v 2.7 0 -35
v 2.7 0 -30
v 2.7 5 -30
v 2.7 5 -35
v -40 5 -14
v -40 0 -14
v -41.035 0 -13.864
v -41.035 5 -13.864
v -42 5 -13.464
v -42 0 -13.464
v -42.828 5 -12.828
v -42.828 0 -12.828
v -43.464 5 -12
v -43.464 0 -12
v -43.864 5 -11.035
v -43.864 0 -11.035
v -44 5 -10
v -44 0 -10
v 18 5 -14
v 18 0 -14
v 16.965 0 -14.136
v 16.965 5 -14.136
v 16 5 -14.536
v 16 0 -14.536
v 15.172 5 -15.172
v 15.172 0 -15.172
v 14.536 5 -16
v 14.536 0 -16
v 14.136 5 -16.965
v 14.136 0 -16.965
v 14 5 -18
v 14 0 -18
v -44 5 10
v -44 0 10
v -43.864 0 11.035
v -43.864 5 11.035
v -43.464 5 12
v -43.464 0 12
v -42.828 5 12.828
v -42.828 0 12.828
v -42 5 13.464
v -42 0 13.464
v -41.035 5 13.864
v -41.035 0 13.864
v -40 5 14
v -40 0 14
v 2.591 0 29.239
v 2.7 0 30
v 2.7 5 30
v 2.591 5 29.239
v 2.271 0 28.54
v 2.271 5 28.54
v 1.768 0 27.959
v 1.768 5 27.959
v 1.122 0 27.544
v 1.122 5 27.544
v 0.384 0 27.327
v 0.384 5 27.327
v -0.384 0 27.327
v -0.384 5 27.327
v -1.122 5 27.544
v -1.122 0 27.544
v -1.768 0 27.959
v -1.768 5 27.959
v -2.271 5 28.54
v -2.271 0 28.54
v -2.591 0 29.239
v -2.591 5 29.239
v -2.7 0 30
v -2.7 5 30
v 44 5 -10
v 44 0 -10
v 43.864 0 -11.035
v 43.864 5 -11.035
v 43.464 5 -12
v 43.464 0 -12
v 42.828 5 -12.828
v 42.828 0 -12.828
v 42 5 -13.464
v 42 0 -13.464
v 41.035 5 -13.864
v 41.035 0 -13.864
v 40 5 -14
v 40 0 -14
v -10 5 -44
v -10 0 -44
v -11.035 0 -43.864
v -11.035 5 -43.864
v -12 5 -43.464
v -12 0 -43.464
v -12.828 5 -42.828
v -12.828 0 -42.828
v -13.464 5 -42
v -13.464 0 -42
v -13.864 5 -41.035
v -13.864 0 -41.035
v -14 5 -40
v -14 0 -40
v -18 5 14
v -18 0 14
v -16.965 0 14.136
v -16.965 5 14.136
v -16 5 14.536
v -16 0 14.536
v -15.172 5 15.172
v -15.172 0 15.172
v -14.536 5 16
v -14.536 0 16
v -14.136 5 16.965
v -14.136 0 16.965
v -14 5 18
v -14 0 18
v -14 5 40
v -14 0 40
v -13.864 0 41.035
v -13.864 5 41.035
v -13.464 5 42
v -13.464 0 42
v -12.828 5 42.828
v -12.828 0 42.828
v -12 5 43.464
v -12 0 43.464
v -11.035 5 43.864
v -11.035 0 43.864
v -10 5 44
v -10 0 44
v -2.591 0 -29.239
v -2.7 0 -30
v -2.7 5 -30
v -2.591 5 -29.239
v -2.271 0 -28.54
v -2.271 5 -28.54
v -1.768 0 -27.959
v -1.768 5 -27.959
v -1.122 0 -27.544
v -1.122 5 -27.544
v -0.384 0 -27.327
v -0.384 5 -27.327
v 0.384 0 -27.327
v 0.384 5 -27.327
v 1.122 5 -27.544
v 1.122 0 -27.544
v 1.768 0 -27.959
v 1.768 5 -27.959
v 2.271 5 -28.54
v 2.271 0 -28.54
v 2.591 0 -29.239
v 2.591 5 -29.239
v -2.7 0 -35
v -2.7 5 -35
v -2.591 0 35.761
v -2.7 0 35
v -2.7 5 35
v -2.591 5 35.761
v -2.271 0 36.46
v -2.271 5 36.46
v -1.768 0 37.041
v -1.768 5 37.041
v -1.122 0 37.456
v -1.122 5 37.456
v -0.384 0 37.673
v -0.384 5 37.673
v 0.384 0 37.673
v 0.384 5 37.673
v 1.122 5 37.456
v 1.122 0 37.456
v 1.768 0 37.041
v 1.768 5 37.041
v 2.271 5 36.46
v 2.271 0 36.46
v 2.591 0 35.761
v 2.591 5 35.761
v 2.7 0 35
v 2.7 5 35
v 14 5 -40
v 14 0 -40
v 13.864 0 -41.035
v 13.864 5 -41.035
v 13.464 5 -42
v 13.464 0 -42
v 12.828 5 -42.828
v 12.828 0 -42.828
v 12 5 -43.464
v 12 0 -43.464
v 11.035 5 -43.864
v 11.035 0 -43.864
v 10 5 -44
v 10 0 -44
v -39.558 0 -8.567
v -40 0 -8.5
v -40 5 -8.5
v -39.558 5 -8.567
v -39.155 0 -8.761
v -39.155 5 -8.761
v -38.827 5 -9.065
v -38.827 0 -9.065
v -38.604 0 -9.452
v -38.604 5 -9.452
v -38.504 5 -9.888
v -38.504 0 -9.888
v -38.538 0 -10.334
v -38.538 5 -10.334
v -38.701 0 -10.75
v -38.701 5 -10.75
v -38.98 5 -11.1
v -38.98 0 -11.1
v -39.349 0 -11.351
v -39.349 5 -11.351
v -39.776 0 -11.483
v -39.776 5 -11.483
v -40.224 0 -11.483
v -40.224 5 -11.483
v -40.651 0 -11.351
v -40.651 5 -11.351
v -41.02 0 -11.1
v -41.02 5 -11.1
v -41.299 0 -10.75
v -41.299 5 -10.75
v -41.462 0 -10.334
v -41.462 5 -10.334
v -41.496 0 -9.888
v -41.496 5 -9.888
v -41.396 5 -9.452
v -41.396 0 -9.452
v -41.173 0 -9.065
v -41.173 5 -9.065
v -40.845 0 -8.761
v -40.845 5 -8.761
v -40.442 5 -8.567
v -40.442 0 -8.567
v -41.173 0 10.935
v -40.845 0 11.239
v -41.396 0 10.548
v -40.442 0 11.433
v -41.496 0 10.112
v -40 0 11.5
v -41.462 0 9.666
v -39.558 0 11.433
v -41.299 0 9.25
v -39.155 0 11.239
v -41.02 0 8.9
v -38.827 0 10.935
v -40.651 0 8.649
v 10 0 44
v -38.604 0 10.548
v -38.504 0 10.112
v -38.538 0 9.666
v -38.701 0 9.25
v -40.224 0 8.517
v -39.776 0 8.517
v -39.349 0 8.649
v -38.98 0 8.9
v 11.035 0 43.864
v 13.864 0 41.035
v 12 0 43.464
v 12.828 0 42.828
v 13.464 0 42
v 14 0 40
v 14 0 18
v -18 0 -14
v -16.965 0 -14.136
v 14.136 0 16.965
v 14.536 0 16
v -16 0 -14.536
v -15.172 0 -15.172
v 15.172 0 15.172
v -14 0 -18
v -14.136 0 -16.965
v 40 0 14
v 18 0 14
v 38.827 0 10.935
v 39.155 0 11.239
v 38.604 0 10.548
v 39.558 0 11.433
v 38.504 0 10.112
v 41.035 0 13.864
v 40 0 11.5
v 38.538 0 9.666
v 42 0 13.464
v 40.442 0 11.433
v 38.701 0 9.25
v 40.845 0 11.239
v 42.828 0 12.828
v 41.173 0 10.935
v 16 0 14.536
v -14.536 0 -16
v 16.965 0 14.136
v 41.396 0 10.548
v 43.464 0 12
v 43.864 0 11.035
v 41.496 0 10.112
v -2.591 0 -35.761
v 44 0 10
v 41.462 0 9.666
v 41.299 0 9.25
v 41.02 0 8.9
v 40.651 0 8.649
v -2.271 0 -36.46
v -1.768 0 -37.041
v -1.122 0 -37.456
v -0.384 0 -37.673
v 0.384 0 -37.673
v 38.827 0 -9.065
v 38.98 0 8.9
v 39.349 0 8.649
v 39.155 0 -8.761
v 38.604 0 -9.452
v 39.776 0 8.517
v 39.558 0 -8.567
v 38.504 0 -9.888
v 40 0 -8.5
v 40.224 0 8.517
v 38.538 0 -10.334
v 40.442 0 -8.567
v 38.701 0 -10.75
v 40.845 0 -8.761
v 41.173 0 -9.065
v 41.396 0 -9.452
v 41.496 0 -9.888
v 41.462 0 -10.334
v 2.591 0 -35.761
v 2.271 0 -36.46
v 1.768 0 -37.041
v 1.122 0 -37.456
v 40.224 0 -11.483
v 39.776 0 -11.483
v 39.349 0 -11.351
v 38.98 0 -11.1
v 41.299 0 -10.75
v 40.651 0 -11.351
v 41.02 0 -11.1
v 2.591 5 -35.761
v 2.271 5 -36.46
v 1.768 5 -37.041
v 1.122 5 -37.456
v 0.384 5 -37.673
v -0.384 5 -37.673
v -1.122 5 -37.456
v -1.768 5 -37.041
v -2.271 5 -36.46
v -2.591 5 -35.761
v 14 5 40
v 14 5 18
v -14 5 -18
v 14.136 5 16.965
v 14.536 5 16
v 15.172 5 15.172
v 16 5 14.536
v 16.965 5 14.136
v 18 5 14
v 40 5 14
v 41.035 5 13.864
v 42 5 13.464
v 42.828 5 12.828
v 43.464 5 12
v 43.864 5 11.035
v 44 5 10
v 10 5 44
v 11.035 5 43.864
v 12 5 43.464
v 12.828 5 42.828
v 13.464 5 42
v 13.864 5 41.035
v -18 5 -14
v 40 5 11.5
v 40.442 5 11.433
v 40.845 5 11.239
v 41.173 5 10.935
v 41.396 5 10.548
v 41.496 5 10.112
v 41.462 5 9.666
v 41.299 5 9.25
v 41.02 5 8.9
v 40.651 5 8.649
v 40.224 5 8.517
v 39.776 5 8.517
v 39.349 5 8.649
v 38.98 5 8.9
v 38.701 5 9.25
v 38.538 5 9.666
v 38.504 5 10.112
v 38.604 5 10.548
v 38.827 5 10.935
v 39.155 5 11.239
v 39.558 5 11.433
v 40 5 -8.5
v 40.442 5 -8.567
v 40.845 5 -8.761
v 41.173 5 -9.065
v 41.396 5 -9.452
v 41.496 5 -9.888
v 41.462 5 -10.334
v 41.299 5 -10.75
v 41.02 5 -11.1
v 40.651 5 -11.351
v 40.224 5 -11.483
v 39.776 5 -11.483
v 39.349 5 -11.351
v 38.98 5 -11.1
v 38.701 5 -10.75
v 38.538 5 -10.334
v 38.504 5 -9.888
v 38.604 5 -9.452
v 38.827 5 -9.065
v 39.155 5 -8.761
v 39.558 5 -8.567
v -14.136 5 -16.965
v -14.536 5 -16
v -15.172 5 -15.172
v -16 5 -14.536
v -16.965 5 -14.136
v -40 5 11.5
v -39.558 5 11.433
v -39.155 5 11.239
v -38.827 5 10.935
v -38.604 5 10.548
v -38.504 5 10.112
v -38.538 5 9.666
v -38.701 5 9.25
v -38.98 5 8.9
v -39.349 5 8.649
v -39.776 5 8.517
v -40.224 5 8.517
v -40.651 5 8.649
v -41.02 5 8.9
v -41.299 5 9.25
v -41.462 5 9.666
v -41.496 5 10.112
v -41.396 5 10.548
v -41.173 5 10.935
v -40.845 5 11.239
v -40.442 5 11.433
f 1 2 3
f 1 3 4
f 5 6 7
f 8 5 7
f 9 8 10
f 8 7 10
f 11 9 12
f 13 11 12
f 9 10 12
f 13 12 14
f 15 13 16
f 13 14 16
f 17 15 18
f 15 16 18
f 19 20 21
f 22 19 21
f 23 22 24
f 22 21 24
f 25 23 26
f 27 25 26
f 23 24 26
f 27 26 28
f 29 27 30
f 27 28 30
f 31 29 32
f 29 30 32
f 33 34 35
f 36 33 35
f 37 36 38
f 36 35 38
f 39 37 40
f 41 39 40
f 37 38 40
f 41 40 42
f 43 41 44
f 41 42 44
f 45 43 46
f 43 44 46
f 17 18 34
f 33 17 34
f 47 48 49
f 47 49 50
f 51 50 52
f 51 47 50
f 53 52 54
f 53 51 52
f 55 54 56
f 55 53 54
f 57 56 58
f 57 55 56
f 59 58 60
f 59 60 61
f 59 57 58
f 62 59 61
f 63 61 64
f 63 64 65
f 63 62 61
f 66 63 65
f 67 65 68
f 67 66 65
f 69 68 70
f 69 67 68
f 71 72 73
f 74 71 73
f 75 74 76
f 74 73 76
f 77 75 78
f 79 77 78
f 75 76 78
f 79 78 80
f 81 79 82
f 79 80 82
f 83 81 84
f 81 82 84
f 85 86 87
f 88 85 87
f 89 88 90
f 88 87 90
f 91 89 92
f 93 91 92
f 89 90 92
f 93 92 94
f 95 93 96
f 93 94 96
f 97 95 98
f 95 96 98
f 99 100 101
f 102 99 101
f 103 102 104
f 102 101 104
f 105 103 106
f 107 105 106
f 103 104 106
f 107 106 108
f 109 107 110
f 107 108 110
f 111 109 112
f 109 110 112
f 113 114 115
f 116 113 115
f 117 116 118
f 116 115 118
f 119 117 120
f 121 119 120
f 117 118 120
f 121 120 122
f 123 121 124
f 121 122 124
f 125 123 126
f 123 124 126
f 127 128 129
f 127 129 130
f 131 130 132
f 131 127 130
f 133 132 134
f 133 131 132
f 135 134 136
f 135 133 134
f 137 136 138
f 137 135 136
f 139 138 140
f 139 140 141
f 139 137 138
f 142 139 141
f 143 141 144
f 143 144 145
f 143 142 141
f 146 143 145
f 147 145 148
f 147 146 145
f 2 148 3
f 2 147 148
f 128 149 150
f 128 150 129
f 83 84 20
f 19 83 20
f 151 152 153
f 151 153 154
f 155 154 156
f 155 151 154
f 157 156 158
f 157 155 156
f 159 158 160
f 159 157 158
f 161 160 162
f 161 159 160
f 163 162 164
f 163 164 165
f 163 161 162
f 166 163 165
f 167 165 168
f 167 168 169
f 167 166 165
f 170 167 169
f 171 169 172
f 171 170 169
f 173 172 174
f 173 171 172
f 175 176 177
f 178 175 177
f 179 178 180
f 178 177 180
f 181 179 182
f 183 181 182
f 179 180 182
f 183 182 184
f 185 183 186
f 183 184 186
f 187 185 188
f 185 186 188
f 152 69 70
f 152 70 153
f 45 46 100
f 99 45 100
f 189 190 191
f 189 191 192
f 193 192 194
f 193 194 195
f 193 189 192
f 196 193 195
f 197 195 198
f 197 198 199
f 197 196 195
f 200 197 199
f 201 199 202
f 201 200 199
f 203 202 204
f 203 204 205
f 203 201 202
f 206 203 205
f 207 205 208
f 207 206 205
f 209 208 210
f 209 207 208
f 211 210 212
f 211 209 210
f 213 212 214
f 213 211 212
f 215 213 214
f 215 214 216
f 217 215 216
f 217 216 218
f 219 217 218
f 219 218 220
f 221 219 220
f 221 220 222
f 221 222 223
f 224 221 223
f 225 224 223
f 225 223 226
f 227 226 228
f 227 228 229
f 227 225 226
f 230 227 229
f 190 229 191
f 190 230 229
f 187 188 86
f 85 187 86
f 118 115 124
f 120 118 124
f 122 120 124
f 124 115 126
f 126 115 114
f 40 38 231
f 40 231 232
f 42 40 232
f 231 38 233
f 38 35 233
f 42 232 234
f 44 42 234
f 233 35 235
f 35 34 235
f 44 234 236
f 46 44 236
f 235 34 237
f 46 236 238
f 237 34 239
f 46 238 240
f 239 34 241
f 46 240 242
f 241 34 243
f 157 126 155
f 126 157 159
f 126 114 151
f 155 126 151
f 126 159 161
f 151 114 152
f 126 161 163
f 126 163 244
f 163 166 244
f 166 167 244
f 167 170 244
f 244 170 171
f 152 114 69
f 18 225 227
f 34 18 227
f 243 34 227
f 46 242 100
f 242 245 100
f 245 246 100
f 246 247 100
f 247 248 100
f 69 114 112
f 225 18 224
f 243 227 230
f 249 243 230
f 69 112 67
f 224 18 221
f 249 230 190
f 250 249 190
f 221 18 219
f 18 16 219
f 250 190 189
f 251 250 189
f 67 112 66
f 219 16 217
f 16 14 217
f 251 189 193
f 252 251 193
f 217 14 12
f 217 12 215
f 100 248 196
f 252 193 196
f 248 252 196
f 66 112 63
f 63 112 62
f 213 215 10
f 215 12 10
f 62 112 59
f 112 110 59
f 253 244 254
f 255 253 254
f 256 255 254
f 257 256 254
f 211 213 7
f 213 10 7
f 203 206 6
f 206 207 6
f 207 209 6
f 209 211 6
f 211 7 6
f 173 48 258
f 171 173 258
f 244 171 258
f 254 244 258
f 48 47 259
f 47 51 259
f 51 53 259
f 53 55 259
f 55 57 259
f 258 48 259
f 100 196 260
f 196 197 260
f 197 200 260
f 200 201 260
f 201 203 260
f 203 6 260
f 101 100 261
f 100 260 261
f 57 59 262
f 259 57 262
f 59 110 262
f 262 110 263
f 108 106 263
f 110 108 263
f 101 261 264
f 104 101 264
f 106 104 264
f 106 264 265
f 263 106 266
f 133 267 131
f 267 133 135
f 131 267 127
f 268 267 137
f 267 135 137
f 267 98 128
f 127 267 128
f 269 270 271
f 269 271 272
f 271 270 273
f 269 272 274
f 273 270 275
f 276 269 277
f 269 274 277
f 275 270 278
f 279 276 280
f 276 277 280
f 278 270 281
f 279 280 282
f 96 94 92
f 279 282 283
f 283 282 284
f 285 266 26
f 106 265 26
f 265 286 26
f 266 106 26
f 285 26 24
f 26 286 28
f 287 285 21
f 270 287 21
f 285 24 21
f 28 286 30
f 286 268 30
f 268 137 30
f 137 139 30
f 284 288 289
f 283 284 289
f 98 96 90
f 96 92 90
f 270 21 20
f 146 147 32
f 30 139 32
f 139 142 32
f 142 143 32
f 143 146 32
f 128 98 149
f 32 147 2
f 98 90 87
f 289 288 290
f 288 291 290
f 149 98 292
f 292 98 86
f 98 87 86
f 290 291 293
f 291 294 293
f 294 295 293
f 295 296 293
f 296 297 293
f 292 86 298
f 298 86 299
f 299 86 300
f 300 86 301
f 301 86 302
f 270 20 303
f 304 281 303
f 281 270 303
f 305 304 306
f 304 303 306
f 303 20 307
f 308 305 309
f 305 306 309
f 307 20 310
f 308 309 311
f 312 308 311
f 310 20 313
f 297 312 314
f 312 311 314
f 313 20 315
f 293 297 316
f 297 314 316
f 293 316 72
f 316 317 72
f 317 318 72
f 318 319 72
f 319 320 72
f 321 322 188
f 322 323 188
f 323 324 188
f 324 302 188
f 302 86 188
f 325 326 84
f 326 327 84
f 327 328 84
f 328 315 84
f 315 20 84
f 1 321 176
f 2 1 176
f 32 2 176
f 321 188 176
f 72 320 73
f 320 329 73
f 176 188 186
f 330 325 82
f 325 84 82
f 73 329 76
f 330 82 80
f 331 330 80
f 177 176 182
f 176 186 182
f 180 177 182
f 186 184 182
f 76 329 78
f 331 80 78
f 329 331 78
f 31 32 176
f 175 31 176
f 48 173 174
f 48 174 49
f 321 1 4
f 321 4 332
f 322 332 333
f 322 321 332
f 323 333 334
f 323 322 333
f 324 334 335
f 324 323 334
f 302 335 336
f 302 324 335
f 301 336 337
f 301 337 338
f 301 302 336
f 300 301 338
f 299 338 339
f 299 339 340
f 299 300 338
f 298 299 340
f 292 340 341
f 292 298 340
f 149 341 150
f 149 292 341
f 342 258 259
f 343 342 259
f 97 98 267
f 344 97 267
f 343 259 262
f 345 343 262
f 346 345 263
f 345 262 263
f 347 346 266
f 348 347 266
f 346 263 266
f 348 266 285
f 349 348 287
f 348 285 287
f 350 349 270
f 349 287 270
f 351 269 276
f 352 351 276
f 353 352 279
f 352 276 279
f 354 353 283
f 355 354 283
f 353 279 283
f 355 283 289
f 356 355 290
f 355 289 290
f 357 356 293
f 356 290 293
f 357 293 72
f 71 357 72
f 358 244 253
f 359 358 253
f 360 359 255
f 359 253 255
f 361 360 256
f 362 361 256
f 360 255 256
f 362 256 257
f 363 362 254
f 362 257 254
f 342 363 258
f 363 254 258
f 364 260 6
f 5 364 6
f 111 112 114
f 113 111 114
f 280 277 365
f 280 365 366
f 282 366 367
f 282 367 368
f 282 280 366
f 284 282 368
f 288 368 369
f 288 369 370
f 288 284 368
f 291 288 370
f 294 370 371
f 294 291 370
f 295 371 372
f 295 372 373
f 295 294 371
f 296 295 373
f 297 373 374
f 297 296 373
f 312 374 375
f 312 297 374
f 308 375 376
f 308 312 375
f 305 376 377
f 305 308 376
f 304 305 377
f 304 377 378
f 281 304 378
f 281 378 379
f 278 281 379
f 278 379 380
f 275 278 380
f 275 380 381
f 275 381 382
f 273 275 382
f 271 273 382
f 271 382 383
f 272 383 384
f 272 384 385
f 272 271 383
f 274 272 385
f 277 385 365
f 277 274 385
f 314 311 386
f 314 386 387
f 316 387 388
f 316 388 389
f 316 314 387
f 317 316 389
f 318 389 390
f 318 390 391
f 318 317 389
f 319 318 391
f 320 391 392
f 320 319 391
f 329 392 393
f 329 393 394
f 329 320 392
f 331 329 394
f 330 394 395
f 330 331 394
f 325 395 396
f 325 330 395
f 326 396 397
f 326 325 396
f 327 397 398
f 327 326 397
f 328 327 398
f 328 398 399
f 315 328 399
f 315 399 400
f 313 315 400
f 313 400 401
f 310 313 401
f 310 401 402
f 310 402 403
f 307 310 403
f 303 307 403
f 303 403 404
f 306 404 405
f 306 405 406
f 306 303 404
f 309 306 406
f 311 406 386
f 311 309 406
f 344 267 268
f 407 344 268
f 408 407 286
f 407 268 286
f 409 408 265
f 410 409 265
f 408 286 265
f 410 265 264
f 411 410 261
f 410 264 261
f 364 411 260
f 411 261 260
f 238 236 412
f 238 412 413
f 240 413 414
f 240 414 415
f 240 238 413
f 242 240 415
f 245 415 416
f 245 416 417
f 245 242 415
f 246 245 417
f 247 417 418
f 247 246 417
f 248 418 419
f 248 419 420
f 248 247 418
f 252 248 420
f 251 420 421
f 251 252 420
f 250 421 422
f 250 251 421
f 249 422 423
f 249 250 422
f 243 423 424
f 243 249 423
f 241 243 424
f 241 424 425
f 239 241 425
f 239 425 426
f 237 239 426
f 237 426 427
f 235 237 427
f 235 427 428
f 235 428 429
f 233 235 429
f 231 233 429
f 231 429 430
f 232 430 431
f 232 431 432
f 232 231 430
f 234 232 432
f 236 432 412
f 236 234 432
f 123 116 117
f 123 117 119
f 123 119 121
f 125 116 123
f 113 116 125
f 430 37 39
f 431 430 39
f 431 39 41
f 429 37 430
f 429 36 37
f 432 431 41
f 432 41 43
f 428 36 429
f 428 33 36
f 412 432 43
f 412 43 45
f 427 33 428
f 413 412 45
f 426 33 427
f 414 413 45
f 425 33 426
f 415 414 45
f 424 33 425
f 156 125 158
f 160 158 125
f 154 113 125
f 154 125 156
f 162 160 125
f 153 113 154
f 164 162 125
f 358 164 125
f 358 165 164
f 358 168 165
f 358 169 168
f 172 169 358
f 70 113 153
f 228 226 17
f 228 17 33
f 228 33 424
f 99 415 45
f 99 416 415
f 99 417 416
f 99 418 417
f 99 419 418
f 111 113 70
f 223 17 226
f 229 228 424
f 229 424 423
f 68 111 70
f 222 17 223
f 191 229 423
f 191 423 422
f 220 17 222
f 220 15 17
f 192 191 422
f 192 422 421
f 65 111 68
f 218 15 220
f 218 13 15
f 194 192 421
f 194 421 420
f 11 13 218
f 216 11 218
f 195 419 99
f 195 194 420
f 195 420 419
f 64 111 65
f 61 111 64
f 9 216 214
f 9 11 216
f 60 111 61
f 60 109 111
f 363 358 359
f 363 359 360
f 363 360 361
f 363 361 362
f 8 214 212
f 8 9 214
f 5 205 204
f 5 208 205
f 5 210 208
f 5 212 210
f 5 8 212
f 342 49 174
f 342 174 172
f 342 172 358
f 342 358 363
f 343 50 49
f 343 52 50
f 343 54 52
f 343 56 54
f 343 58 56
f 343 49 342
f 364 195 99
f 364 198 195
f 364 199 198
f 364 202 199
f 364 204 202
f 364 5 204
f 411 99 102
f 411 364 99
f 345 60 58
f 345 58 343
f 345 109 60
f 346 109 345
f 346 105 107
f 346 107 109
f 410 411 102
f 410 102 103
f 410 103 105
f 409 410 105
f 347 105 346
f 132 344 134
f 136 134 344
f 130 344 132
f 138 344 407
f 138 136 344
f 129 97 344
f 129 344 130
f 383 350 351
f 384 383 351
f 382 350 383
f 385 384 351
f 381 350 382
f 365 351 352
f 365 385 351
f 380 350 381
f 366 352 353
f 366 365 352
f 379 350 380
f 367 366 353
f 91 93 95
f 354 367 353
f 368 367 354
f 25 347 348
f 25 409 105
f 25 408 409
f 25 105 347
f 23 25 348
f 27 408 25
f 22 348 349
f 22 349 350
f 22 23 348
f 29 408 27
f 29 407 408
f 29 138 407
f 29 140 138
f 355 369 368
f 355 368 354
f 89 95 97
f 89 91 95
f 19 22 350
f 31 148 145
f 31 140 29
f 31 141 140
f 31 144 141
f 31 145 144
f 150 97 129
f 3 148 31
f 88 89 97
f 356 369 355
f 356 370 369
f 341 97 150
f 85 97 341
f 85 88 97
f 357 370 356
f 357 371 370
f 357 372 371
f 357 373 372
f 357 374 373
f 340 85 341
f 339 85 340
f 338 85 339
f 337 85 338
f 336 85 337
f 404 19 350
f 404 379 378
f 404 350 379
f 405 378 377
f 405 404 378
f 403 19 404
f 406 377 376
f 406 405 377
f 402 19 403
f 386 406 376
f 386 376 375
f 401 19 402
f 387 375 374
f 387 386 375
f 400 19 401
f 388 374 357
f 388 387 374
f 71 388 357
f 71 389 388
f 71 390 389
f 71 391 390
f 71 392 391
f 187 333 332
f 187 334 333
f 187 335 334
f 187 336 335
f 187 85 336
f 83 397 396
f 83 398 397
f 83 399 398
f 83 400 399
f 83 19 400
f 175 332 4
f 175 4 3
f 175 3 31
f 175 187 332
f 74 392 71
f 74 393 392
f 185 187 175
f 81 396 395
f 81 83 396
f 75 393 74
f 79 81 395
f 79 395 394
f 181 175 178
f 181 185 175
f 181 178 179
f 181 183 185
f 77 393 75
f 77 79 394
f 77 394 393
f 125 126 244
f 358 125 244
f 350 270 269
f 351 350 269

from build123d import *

# Parameters (mm, degrees)
SKETCH_1_R      = 1.5
EXTRUDE_1_DEPTH = 5


with BuildPart() as part:
    # 草图1 → 凸台-拉伸1 (new body)
    with BuildSketch(Plane(origin=(0, 0, 0), x_dir=(1, 0, 0), z_dir=(0, 1, 0))):
        with BuildLine():
            Line((14, -40), (14, -18))
            ThreePointArc((14, -18), (15.171572875, -15.171572875), (18, -14))
            Line((18, -14), (40, -14))
            ThreePointArc((40, -14), (42.828427125, -12.828427125), (44, -10))
            Line((44, -10), (44, 10))
            ThreePointArc((44, 10), (42.828427125, 12.828427125), (40, 14))
            Line((40, 14), (18, 14))
            ThreePointArc((18, 14), (15.171572875, 15.171572875), (14, 18))
            Line((14, 18), (14, 40))
            ThreePointArc((14, 40), (12.828427125, 42.828427125), (10, 44))
            Line((10, 44), (-10, 44))
            ThreePointArc((-10, 44), (-12.828427125, 42.828427125), (-14, 40))
            Line((-14, 40), (-14, 18))
            ThreePointArc((-14, 18), (-15.171572875, 15.171572875), (-18, 14))
            Line((-18, 14), (-40, 14))
            ThreePointArc((-40, 14), (-42.828427125, 12.828427125), (-44, 10))
            Line((-44, 10), (-44, -10))
            ThreePointArc((-44, -10), (-42.828427125, -12.828427125), (-40, -14))
            Line((-40, -14), (-18, -14))
            ThreePointArc((-18, -14), (-15.171572875, -15.171572875), (-14, -18))
            Line((-14, -18), (-14, -40))
            ThreePointArc((-14, -40), (-12.828427125, -42.828427125), (-10, -44))
            Line((-10, -44), (10, -44))
            ThreePointArc((10, -44), (12.828427125, -42.828427125), (14, -40))
        make_face()
        with Locations(Location((40, 10, 0), (0, 0, 270))):
            Circle(SKETCH_1_R, mode=Mode.SUBTRACT)
        with Locations(Location((40, -10, 0), (0, 0, 270))):
            Circle(SKETCH_1_R, mode=Mode.SUBTRACT)
        with Locations(Location((-40, 10, 0), (0, 0, 270))):
            Circle(SKETCH_1_R, mode=Mode.SUBTRACT)
        with Locations(Location((-40, -10, 0), (0, 0, 270))):
            Circle(SKETCH_1_R, mode=Mode.SUBTRACT)
        with BuildLine():
            ThreePointArc((-2.7, 30), (0, 27.3), (2.7, 30))
            Line((2.7, 30), (2.7, 35))
            ThreePointArc((2.7, 35), (0, 37.7), (-2.7, 35))
            Line((-2.7, 35), (-2.7, 30))
        make_face(mode=Mode.SUBTRACT)
        with BuildLine():
            ThreePointArc((2.7, -30), (0, -27.3), (-2.7, -30))
            Line((-2.7, -30), (-2.7, -35))
            ThreePointArc((-2.7, -35), (0, -37.7), (2.7, -35))
            Line((2.7, -35), (2.7, -30))
        make_face(mode=Mode.SUBTRACT)
    extrude(amount=EXTRUDE_1_DEPTH)


solid = part.part
